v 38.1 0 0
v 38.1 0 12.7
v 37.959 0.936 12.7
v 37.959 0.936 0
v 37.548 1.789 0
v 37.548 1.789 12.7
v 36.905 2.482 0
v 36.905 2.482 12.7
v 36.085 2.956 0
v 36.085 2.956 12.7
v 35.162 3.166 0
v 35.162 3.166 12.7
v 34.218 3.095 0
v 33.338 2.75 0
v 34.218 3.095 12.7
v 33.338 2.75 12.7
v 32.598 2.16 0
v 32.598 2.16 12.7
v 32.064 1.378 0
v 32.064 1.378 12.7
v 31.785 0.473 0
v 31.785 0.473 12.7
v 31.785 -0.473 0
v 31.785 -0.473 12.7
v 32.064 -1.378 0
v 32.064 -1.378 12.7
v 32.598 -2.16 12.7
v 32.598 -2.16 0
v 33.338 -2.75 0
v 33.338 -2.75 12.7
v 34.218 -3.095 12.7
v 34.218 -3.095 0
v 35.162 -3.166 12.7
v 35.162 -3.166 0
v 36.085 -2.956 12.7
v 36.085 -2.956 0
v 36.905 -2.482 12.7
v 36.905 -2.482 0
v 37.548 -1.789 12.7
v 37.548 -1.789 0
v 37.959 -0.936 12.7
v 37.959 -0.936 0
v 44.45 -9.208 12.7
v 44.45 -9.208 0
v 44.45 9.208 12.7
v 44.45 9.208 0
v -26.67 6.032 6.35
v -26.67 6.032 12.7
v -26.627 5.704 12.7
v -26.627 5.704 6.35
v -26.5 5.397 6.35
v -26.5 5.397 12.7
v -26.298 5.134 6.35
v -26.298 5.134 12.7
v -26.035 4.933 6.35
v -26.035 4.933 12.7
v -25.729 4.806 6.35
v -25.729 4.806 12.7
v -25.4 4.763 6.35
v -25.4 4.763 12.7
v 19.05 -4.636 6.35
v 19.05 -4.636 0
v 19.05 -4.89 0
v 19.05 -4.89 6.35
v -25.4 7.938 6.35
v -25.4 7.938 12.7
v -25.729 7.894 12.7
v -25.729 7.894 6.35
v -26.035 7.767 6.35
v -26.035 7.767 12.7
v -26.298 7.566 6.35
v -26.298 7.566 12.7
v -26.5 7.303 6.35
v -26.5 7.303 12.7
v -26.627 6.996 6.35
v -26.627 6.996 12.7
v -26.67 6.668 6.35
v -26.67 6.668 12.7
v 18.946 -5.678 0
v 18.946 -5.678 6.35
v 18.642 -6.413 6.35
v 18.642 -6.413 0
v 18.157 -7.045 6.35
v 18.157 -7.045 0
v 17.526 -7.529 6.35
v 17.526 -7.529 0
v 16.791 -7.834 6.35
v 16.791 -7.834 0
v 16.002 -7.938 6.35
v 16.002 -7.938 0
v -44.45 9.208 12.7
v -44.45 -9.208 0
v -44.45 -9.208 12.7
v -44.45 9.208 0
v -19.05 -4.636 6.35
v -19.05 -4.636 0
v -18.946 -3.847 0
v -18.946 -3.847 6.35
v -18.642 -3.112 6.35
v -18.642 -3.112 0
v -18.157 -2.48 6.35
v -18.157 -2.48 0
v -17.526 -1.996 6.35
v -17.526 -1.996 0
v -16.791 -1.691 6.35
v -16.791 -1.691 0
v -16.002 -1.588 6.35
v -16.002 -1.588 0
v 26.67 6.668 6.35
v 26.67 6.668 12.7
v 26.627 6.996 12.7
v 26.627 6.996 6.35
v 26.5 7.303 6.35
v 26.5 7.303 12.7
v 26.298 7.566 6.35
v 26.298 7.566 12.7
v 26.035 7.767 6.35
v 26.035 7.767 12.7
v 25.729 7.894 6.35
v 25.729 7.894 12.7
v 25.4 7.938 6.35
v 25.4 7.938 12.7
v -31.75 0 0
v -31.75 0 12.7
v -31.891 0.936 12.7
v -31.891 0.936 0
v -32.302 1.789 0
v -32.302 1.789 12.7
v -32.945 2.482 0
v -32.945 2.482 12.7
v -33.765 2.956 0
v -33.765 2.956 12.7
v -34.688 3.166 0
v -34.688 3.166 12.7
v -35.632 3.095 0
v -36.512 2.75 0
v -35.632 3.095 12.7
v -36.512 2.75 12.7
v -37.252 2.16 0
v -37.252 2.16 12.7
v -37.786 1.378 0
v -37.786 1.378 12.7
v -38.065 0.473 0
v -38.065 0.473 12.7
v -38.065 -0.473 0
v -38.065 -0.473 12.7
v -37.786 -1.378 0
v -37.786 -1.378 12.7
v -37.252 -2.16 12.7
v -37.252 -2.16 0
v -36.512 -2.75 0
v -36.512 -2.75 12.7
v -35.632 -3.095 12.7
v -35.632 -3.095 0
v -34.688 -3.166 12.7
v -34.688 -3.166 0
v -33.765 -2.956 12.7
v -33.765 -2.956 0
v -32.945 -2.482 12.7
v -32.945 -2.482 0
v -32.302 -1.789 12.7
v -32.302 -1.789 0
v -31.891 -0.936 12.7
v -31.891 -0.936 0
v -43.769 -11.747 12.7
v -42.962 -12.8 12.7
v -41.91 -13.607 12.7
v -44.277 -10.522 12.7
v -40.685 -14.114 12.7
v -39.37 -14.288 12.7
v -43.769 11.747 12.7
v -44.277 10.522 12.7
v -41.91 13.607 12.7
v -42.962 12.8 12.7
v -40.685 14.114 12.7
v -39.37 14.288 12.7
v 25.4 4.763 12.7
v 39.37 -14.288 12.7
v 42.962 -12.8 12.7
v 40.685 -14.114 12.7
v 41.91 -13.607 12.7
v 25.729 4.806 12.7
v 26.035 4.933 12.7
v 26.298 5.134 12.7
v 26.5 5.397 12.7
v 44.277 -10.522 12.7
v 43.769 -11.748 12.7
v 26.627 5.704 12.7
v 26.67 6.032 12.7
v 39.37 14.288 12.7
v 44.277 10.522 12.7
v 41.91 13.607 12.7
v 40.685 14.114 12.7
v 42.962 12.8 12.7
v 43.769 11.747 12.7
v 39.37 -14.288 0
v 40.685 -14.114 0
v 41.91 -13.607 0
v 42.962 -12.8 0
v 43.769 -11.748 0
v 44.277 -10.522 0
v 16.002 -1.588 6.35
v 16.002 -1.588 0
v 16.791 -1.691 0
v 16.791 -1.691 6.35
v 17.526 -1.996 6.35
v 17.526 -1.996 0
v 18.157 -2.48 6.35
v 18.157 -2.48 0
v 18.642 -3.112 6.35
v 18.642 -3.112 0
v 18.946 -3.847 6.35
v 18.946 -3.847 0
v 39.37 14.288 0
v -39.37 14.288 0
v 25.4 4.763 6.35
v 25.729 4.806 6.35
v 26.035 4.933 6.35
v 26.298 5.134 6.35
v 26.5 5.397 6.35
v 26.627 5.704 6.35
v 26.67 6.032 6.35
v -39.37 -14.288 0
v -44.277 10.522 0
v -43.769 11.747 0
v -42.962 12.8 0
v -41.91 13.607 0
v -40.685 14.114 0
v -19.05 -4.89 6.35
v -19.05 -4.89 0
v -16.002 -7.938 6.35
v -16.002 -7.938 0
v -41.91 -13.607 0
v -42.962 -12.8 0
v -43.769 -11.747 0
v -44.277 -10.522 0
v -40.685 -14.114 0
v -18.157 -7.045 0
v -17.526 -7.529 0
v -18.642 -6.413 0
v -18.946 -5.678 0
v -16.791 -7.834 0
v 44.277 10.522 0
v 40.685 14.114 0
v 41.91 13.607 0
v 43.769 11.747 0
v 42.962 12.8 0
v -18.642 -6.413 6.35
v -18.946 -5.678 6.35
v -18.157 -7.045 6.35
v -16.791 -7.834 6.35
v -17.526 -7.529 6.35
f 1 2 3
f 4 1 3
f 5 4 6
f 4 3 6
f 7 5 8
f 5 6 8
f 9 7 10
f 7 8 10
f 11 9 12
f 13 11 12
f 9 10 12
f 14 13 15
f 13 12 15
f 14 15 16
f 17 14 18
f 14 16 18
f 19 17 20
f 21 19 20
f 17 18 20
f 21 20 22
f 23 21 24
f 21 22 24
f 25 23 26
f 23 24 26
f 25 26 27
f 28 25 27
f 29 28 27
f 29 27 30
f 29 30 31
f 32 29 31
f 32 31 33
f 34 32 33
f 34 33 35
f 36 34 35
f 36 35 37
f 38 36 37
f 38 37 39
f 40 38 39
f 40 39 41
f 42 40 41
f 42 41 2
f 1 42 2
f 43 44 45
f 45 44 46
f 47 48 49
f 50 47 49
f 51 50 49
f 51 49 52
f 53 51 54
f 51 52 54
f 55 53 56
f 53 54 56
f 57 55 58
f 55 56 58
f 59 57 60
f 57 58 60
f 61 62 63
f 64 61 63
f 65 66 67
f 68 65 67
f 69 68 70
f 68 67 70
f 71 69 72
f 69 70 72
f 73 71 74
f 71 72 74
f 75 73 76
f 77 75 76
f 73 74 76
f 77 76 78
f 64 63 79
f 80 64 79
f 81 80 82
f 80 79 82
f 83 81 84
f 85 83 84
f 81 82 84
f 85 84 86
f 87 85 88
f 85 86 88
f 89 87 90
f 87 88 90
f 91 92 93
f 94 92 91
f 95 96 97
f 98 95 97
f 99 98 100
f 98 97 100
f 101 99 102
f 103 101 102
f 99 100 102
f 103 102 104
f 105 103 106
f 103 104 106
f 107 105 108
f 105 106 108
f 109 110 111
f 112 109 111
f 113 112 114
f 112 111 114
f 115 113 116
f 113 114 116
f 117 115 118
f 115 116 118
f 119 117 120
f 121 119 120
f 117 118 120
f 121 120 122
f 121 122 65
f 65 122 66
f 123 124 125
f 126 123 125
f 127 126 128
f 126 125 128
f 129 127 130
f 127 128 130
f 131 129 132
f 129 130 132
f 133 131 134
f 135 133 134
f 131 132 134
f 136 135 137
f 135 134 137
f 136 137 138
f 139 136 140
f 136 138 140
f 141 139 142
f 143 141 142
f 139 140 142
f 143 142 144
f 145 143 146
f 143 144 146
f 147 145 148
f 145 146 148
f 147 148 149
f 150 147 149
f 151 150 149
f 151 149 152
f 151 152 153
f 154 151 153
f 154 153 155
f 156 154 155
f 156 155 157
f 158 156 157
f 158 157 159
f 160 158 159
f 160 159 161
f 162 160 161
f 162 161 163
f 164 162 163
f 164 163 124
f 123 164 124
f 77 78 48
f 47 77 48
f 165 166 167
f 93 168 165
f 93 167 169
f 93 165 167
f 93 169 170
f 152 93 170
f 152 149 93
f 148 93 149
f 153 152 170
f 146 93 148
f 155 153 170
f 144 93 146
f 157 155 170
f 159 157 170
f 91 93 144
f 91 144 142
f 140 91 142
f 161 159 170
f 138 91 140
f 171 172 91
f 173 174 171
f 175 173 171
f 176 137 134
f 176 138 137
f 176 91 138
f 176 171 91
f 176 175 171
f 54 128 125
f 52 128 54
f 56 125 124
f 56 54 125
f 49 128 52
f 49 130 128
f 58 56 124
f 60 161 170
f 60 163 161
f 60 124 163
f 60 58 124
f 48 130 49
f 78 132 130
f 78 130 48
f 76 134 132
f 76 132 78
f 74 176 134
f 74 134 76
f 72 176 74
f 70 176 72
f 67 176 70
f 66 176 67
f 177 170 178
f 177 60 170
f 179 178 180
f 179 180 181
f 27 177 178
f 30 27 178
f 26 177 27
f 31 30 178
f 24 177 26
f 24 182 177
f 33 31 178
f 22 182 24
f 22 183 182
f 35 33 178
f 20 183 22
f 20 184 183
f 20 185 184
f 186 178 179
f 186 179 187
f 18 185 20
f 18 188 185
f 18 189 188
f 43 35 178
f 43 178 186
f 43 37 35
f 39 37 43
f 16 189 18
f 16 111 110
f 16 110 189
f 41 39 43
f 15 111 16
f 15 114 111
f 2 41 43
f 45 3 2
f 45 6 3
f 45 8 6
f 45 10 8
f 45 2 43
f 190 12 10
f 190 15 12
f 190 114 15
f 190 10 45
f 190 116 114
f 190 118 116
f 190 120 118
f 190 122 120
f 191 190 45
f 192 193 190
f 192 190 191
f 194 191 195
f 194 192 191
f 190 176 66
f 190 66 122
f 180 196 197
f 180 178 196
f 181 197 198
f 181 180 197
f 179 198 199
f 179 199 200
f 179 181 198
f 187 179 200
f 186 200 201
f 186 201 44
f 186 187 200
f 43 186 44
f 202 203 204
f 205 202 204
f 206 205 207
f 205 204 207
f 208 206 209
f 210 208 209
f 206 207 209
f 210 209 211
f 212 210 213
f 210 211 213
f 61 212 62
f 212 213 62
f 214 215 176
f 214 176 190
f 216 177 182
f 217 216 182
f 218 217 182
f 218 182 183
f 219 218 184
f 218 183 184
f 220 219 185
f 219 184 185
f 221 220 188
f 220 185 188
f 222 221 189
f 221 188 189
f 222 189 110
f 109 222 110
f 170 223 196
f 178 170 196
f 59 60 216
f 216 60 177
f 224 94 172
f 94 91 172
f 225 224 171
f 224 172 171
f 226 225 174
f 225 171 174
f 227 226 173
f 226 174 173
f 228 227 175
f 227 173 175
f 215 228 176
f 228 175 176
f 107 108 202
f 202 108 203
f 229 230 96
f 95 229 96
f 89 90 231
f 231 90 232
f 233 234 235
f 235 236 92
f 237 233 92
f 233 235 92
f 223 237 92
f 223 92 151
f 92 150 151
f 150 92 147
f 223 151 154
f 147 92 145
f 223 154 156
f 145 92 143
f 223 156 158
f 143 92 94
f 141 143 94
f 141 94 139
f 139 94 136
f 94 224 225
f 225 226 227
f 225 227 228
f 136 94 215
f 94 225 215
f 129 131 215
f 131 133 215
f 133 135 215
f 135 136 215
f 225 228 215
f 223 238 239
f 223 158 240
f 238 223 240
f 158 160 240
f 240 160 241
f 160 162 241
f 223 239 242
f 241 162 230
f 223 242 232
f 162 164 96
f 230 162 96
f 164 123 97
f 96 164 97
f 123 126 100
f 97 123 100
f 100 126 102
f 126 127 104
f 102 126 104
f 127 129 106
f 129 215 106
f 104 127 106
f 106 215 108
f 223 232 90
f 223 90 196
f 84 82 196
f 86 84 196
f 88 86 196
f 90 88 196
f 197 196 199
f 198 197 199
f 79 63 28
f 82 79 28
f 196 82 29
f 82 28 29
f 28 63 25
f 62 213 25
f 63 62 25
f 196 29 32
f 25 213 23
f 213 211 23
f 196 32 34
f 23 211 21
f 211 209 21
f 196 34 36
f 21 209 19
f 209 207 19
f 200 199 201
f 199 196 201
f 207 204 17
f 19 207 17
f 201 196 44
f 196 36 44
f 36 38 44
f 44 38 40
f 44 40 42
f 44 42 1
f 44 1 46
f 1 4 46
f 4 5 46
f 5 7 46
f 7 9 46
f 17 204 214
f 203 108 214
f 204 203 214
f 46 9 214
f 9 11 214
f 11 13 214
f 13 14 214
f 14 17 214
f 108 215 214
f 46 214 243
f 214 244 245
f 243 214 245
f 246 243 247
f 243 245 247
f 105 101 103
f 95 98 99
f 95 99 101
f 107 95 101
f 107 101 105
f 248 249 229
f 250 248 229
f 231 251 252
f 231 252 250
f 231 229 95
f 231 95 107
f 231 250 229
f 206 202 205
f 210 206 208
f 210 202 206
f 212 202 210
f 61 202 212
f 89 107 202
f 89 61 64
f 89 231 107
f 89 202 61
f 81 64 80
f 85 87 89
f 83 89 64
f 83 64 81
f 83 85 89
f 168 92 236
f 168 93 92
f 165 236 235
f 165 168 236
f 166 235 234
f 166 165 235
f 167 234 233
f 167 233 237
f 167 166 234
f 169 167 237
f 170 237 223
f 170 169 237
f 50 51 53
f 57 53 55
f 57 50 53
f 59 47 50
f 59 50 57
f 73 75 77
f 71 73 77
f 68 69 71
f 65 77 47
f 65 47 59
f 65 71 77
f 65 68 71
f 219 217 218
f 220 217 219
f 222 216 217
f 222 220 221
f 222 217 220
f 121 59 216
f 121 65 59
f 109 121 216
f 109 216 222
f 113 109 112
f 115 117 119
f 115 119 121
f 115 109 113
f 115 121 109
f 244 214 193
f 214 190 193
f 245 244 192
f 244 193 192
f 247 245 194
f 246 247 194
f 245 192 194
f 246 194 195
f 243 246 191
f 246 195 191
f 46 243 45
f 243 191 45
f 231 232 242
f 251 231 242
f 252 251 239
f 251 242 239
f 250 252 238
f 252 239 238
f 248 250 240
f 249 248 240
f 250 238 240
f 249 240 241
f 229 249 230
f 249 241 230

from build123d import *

# Parameters (mm, degrees)
F0_W     = 88.9
F0_H     = 28.575
F1_DEPTH = 12.7
F3_DEPTH = 6.35
F4_R     = 5.08
F6_DEPTH = 6.35
F7_R     = 3.175
F8_DEPTH = 25.4


with BuildPart() as f1:
    # F0 (on Top) → F1 (new body)
    with BuildSketch(Plane.XY):
        Rectangle(F0_W, F0_H)
    extrude(amount=F1_DEPTH)

    # F2 (on face) → F3 (cut)
    with BuildSketch(Plane.XY.offset(12.7)):
        with BuildLine():
            Line((25.4, 7.9375), (-25.4, 7.9375))
            ThreePointArc((-25.4, 7.9375), (-26.298026, 7.565526), (-26.67, 6.6675))
            Line((-26.67, 6.6675), (-26.67, 6.0325))
            ThreePointArc((-26.67, 6.0325), (-26.298026, 5.134474), (-25.4, 4.7625))
            Line((-25.4, 4.7625), (25.4, 4.7625))
            ThreePointArc((25.4, 4.7625), (26.298026, 5.134474), (26.67, 6.0325))
            Line((26.67, 6.0325), (26.67, 6.6675))
            ThreePointArc((26.67, 6.6675), (26.298026, 7.565526), (25.4, 7.9375))
        make_face()
    extrude(amount=-F3_DEPTH, mode=Mode.SUBTRACT)

    # F4
    f4_edges = [f1.edges().sort_by_distance(p)[0] for p in [
        (44.45, -14.2875, 6.35),
        (44.45, 14.2875, 6.35),
        (-44.45, -14.2875, 6.35),
        (-44.45, 14.2875, 6.35),
    ]]
    fillet(f4_edges, radius=F4_R)

    # F5 (on face) → F6 (cut)
    with BuildSketch(Plane(origin=(0, 0, 0), x_dir=(1, 0, 0), z_dir=(0, 0, -1))):
        with BuildLine():
            Line((16.002, 7.9375), (-16.002, 7.9375))
            ThreePointArc((-16.002, 7.9375), (-18.157261, 7.044761), (-19.05, 4.8895))
            Line((-19.05, 4.8895), (-19.05, 4.6355))
            ThreePointArc((-19.05, 4.6355), (-18.157261, 2.480239), (-16.002, 1.5875))
            Line((-16.002, 1.5875), (16.002, 1.5875))
            ThreePointArc((16.002, 1.5875), (18.157261, 2.480239), (19.05, 4.6355))
            Line((19.05, 4.6355), (19.05, 4.8895))
            ThreePointArc((19.05, 4.8895), (18.157261, 7.044761), (16.002, 7.9375))
        make_face()
    extrude(amount=-F6_DEPTH, mode=Mode.SUBTRACT)

    # F7 (on face) → F8 (cut)
    with BuildSketch(Plane.XY.offset(12.7)):
        with Locations((-34.925, 0)):
            Circle(F7_R)
        with Locations((34.925, 0)):
            Circle(F7_R)
    extrude(amount=-F8_DEPTH, mode=Mode.SUBTRACT)


solid = f1.part
